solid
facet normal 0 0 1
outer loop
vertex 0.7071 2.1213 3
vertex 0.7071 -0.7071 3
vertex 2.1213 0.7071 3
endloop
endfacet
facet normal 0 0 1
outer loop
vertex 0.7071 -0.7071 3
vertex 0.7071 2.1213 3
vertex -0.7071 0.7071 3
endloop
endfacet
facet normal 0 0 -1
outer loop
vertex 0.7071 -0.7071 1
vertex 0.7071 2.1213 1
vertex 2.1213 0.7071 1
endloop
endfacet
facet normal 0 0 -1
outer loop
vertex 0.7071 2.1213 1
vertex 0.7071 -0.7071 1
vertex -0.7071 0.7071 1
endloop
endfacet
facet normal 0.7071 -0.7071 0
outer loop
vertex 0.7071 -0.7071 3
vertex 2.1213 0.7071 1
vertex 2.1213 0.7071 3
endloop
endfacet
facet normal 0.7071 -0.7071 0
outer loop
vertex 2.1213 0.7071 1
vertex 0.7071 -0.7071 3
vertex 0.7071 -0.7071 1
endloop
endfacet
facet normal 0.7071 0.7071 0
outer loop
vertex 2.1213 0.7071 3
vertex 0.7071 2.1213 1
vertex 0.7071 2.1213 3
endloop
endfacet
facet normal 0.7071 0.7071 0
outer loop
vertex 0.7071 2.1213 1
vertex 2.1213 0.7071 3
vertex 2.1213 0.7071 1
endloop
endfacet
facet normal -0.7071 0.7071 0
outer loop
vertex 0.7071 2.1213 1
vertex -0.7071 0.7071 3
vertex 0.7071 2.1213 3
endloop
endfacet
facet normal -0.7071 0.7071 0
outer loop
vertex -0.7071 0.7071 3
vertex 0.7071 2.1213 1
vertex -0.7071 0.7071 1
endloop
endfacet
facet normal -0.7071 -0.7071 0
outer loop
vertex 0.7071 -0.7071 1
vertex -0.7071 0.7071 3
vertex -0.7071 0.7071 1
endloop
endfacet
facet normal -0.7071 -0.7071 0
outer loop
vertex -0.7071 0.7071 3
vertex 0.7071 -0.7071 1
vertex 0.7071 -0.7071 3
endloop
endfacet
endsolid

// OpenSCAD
rotate(a=[0, 0, 45]) {
    translate(v=[2, 0, 0]) {
        translate(v=[0, 0, 2]) {
            translate(v=[-1, 0, 0]) {
                cube(size=[2, 2, 2], center=true);
            };
        };
    };
};
